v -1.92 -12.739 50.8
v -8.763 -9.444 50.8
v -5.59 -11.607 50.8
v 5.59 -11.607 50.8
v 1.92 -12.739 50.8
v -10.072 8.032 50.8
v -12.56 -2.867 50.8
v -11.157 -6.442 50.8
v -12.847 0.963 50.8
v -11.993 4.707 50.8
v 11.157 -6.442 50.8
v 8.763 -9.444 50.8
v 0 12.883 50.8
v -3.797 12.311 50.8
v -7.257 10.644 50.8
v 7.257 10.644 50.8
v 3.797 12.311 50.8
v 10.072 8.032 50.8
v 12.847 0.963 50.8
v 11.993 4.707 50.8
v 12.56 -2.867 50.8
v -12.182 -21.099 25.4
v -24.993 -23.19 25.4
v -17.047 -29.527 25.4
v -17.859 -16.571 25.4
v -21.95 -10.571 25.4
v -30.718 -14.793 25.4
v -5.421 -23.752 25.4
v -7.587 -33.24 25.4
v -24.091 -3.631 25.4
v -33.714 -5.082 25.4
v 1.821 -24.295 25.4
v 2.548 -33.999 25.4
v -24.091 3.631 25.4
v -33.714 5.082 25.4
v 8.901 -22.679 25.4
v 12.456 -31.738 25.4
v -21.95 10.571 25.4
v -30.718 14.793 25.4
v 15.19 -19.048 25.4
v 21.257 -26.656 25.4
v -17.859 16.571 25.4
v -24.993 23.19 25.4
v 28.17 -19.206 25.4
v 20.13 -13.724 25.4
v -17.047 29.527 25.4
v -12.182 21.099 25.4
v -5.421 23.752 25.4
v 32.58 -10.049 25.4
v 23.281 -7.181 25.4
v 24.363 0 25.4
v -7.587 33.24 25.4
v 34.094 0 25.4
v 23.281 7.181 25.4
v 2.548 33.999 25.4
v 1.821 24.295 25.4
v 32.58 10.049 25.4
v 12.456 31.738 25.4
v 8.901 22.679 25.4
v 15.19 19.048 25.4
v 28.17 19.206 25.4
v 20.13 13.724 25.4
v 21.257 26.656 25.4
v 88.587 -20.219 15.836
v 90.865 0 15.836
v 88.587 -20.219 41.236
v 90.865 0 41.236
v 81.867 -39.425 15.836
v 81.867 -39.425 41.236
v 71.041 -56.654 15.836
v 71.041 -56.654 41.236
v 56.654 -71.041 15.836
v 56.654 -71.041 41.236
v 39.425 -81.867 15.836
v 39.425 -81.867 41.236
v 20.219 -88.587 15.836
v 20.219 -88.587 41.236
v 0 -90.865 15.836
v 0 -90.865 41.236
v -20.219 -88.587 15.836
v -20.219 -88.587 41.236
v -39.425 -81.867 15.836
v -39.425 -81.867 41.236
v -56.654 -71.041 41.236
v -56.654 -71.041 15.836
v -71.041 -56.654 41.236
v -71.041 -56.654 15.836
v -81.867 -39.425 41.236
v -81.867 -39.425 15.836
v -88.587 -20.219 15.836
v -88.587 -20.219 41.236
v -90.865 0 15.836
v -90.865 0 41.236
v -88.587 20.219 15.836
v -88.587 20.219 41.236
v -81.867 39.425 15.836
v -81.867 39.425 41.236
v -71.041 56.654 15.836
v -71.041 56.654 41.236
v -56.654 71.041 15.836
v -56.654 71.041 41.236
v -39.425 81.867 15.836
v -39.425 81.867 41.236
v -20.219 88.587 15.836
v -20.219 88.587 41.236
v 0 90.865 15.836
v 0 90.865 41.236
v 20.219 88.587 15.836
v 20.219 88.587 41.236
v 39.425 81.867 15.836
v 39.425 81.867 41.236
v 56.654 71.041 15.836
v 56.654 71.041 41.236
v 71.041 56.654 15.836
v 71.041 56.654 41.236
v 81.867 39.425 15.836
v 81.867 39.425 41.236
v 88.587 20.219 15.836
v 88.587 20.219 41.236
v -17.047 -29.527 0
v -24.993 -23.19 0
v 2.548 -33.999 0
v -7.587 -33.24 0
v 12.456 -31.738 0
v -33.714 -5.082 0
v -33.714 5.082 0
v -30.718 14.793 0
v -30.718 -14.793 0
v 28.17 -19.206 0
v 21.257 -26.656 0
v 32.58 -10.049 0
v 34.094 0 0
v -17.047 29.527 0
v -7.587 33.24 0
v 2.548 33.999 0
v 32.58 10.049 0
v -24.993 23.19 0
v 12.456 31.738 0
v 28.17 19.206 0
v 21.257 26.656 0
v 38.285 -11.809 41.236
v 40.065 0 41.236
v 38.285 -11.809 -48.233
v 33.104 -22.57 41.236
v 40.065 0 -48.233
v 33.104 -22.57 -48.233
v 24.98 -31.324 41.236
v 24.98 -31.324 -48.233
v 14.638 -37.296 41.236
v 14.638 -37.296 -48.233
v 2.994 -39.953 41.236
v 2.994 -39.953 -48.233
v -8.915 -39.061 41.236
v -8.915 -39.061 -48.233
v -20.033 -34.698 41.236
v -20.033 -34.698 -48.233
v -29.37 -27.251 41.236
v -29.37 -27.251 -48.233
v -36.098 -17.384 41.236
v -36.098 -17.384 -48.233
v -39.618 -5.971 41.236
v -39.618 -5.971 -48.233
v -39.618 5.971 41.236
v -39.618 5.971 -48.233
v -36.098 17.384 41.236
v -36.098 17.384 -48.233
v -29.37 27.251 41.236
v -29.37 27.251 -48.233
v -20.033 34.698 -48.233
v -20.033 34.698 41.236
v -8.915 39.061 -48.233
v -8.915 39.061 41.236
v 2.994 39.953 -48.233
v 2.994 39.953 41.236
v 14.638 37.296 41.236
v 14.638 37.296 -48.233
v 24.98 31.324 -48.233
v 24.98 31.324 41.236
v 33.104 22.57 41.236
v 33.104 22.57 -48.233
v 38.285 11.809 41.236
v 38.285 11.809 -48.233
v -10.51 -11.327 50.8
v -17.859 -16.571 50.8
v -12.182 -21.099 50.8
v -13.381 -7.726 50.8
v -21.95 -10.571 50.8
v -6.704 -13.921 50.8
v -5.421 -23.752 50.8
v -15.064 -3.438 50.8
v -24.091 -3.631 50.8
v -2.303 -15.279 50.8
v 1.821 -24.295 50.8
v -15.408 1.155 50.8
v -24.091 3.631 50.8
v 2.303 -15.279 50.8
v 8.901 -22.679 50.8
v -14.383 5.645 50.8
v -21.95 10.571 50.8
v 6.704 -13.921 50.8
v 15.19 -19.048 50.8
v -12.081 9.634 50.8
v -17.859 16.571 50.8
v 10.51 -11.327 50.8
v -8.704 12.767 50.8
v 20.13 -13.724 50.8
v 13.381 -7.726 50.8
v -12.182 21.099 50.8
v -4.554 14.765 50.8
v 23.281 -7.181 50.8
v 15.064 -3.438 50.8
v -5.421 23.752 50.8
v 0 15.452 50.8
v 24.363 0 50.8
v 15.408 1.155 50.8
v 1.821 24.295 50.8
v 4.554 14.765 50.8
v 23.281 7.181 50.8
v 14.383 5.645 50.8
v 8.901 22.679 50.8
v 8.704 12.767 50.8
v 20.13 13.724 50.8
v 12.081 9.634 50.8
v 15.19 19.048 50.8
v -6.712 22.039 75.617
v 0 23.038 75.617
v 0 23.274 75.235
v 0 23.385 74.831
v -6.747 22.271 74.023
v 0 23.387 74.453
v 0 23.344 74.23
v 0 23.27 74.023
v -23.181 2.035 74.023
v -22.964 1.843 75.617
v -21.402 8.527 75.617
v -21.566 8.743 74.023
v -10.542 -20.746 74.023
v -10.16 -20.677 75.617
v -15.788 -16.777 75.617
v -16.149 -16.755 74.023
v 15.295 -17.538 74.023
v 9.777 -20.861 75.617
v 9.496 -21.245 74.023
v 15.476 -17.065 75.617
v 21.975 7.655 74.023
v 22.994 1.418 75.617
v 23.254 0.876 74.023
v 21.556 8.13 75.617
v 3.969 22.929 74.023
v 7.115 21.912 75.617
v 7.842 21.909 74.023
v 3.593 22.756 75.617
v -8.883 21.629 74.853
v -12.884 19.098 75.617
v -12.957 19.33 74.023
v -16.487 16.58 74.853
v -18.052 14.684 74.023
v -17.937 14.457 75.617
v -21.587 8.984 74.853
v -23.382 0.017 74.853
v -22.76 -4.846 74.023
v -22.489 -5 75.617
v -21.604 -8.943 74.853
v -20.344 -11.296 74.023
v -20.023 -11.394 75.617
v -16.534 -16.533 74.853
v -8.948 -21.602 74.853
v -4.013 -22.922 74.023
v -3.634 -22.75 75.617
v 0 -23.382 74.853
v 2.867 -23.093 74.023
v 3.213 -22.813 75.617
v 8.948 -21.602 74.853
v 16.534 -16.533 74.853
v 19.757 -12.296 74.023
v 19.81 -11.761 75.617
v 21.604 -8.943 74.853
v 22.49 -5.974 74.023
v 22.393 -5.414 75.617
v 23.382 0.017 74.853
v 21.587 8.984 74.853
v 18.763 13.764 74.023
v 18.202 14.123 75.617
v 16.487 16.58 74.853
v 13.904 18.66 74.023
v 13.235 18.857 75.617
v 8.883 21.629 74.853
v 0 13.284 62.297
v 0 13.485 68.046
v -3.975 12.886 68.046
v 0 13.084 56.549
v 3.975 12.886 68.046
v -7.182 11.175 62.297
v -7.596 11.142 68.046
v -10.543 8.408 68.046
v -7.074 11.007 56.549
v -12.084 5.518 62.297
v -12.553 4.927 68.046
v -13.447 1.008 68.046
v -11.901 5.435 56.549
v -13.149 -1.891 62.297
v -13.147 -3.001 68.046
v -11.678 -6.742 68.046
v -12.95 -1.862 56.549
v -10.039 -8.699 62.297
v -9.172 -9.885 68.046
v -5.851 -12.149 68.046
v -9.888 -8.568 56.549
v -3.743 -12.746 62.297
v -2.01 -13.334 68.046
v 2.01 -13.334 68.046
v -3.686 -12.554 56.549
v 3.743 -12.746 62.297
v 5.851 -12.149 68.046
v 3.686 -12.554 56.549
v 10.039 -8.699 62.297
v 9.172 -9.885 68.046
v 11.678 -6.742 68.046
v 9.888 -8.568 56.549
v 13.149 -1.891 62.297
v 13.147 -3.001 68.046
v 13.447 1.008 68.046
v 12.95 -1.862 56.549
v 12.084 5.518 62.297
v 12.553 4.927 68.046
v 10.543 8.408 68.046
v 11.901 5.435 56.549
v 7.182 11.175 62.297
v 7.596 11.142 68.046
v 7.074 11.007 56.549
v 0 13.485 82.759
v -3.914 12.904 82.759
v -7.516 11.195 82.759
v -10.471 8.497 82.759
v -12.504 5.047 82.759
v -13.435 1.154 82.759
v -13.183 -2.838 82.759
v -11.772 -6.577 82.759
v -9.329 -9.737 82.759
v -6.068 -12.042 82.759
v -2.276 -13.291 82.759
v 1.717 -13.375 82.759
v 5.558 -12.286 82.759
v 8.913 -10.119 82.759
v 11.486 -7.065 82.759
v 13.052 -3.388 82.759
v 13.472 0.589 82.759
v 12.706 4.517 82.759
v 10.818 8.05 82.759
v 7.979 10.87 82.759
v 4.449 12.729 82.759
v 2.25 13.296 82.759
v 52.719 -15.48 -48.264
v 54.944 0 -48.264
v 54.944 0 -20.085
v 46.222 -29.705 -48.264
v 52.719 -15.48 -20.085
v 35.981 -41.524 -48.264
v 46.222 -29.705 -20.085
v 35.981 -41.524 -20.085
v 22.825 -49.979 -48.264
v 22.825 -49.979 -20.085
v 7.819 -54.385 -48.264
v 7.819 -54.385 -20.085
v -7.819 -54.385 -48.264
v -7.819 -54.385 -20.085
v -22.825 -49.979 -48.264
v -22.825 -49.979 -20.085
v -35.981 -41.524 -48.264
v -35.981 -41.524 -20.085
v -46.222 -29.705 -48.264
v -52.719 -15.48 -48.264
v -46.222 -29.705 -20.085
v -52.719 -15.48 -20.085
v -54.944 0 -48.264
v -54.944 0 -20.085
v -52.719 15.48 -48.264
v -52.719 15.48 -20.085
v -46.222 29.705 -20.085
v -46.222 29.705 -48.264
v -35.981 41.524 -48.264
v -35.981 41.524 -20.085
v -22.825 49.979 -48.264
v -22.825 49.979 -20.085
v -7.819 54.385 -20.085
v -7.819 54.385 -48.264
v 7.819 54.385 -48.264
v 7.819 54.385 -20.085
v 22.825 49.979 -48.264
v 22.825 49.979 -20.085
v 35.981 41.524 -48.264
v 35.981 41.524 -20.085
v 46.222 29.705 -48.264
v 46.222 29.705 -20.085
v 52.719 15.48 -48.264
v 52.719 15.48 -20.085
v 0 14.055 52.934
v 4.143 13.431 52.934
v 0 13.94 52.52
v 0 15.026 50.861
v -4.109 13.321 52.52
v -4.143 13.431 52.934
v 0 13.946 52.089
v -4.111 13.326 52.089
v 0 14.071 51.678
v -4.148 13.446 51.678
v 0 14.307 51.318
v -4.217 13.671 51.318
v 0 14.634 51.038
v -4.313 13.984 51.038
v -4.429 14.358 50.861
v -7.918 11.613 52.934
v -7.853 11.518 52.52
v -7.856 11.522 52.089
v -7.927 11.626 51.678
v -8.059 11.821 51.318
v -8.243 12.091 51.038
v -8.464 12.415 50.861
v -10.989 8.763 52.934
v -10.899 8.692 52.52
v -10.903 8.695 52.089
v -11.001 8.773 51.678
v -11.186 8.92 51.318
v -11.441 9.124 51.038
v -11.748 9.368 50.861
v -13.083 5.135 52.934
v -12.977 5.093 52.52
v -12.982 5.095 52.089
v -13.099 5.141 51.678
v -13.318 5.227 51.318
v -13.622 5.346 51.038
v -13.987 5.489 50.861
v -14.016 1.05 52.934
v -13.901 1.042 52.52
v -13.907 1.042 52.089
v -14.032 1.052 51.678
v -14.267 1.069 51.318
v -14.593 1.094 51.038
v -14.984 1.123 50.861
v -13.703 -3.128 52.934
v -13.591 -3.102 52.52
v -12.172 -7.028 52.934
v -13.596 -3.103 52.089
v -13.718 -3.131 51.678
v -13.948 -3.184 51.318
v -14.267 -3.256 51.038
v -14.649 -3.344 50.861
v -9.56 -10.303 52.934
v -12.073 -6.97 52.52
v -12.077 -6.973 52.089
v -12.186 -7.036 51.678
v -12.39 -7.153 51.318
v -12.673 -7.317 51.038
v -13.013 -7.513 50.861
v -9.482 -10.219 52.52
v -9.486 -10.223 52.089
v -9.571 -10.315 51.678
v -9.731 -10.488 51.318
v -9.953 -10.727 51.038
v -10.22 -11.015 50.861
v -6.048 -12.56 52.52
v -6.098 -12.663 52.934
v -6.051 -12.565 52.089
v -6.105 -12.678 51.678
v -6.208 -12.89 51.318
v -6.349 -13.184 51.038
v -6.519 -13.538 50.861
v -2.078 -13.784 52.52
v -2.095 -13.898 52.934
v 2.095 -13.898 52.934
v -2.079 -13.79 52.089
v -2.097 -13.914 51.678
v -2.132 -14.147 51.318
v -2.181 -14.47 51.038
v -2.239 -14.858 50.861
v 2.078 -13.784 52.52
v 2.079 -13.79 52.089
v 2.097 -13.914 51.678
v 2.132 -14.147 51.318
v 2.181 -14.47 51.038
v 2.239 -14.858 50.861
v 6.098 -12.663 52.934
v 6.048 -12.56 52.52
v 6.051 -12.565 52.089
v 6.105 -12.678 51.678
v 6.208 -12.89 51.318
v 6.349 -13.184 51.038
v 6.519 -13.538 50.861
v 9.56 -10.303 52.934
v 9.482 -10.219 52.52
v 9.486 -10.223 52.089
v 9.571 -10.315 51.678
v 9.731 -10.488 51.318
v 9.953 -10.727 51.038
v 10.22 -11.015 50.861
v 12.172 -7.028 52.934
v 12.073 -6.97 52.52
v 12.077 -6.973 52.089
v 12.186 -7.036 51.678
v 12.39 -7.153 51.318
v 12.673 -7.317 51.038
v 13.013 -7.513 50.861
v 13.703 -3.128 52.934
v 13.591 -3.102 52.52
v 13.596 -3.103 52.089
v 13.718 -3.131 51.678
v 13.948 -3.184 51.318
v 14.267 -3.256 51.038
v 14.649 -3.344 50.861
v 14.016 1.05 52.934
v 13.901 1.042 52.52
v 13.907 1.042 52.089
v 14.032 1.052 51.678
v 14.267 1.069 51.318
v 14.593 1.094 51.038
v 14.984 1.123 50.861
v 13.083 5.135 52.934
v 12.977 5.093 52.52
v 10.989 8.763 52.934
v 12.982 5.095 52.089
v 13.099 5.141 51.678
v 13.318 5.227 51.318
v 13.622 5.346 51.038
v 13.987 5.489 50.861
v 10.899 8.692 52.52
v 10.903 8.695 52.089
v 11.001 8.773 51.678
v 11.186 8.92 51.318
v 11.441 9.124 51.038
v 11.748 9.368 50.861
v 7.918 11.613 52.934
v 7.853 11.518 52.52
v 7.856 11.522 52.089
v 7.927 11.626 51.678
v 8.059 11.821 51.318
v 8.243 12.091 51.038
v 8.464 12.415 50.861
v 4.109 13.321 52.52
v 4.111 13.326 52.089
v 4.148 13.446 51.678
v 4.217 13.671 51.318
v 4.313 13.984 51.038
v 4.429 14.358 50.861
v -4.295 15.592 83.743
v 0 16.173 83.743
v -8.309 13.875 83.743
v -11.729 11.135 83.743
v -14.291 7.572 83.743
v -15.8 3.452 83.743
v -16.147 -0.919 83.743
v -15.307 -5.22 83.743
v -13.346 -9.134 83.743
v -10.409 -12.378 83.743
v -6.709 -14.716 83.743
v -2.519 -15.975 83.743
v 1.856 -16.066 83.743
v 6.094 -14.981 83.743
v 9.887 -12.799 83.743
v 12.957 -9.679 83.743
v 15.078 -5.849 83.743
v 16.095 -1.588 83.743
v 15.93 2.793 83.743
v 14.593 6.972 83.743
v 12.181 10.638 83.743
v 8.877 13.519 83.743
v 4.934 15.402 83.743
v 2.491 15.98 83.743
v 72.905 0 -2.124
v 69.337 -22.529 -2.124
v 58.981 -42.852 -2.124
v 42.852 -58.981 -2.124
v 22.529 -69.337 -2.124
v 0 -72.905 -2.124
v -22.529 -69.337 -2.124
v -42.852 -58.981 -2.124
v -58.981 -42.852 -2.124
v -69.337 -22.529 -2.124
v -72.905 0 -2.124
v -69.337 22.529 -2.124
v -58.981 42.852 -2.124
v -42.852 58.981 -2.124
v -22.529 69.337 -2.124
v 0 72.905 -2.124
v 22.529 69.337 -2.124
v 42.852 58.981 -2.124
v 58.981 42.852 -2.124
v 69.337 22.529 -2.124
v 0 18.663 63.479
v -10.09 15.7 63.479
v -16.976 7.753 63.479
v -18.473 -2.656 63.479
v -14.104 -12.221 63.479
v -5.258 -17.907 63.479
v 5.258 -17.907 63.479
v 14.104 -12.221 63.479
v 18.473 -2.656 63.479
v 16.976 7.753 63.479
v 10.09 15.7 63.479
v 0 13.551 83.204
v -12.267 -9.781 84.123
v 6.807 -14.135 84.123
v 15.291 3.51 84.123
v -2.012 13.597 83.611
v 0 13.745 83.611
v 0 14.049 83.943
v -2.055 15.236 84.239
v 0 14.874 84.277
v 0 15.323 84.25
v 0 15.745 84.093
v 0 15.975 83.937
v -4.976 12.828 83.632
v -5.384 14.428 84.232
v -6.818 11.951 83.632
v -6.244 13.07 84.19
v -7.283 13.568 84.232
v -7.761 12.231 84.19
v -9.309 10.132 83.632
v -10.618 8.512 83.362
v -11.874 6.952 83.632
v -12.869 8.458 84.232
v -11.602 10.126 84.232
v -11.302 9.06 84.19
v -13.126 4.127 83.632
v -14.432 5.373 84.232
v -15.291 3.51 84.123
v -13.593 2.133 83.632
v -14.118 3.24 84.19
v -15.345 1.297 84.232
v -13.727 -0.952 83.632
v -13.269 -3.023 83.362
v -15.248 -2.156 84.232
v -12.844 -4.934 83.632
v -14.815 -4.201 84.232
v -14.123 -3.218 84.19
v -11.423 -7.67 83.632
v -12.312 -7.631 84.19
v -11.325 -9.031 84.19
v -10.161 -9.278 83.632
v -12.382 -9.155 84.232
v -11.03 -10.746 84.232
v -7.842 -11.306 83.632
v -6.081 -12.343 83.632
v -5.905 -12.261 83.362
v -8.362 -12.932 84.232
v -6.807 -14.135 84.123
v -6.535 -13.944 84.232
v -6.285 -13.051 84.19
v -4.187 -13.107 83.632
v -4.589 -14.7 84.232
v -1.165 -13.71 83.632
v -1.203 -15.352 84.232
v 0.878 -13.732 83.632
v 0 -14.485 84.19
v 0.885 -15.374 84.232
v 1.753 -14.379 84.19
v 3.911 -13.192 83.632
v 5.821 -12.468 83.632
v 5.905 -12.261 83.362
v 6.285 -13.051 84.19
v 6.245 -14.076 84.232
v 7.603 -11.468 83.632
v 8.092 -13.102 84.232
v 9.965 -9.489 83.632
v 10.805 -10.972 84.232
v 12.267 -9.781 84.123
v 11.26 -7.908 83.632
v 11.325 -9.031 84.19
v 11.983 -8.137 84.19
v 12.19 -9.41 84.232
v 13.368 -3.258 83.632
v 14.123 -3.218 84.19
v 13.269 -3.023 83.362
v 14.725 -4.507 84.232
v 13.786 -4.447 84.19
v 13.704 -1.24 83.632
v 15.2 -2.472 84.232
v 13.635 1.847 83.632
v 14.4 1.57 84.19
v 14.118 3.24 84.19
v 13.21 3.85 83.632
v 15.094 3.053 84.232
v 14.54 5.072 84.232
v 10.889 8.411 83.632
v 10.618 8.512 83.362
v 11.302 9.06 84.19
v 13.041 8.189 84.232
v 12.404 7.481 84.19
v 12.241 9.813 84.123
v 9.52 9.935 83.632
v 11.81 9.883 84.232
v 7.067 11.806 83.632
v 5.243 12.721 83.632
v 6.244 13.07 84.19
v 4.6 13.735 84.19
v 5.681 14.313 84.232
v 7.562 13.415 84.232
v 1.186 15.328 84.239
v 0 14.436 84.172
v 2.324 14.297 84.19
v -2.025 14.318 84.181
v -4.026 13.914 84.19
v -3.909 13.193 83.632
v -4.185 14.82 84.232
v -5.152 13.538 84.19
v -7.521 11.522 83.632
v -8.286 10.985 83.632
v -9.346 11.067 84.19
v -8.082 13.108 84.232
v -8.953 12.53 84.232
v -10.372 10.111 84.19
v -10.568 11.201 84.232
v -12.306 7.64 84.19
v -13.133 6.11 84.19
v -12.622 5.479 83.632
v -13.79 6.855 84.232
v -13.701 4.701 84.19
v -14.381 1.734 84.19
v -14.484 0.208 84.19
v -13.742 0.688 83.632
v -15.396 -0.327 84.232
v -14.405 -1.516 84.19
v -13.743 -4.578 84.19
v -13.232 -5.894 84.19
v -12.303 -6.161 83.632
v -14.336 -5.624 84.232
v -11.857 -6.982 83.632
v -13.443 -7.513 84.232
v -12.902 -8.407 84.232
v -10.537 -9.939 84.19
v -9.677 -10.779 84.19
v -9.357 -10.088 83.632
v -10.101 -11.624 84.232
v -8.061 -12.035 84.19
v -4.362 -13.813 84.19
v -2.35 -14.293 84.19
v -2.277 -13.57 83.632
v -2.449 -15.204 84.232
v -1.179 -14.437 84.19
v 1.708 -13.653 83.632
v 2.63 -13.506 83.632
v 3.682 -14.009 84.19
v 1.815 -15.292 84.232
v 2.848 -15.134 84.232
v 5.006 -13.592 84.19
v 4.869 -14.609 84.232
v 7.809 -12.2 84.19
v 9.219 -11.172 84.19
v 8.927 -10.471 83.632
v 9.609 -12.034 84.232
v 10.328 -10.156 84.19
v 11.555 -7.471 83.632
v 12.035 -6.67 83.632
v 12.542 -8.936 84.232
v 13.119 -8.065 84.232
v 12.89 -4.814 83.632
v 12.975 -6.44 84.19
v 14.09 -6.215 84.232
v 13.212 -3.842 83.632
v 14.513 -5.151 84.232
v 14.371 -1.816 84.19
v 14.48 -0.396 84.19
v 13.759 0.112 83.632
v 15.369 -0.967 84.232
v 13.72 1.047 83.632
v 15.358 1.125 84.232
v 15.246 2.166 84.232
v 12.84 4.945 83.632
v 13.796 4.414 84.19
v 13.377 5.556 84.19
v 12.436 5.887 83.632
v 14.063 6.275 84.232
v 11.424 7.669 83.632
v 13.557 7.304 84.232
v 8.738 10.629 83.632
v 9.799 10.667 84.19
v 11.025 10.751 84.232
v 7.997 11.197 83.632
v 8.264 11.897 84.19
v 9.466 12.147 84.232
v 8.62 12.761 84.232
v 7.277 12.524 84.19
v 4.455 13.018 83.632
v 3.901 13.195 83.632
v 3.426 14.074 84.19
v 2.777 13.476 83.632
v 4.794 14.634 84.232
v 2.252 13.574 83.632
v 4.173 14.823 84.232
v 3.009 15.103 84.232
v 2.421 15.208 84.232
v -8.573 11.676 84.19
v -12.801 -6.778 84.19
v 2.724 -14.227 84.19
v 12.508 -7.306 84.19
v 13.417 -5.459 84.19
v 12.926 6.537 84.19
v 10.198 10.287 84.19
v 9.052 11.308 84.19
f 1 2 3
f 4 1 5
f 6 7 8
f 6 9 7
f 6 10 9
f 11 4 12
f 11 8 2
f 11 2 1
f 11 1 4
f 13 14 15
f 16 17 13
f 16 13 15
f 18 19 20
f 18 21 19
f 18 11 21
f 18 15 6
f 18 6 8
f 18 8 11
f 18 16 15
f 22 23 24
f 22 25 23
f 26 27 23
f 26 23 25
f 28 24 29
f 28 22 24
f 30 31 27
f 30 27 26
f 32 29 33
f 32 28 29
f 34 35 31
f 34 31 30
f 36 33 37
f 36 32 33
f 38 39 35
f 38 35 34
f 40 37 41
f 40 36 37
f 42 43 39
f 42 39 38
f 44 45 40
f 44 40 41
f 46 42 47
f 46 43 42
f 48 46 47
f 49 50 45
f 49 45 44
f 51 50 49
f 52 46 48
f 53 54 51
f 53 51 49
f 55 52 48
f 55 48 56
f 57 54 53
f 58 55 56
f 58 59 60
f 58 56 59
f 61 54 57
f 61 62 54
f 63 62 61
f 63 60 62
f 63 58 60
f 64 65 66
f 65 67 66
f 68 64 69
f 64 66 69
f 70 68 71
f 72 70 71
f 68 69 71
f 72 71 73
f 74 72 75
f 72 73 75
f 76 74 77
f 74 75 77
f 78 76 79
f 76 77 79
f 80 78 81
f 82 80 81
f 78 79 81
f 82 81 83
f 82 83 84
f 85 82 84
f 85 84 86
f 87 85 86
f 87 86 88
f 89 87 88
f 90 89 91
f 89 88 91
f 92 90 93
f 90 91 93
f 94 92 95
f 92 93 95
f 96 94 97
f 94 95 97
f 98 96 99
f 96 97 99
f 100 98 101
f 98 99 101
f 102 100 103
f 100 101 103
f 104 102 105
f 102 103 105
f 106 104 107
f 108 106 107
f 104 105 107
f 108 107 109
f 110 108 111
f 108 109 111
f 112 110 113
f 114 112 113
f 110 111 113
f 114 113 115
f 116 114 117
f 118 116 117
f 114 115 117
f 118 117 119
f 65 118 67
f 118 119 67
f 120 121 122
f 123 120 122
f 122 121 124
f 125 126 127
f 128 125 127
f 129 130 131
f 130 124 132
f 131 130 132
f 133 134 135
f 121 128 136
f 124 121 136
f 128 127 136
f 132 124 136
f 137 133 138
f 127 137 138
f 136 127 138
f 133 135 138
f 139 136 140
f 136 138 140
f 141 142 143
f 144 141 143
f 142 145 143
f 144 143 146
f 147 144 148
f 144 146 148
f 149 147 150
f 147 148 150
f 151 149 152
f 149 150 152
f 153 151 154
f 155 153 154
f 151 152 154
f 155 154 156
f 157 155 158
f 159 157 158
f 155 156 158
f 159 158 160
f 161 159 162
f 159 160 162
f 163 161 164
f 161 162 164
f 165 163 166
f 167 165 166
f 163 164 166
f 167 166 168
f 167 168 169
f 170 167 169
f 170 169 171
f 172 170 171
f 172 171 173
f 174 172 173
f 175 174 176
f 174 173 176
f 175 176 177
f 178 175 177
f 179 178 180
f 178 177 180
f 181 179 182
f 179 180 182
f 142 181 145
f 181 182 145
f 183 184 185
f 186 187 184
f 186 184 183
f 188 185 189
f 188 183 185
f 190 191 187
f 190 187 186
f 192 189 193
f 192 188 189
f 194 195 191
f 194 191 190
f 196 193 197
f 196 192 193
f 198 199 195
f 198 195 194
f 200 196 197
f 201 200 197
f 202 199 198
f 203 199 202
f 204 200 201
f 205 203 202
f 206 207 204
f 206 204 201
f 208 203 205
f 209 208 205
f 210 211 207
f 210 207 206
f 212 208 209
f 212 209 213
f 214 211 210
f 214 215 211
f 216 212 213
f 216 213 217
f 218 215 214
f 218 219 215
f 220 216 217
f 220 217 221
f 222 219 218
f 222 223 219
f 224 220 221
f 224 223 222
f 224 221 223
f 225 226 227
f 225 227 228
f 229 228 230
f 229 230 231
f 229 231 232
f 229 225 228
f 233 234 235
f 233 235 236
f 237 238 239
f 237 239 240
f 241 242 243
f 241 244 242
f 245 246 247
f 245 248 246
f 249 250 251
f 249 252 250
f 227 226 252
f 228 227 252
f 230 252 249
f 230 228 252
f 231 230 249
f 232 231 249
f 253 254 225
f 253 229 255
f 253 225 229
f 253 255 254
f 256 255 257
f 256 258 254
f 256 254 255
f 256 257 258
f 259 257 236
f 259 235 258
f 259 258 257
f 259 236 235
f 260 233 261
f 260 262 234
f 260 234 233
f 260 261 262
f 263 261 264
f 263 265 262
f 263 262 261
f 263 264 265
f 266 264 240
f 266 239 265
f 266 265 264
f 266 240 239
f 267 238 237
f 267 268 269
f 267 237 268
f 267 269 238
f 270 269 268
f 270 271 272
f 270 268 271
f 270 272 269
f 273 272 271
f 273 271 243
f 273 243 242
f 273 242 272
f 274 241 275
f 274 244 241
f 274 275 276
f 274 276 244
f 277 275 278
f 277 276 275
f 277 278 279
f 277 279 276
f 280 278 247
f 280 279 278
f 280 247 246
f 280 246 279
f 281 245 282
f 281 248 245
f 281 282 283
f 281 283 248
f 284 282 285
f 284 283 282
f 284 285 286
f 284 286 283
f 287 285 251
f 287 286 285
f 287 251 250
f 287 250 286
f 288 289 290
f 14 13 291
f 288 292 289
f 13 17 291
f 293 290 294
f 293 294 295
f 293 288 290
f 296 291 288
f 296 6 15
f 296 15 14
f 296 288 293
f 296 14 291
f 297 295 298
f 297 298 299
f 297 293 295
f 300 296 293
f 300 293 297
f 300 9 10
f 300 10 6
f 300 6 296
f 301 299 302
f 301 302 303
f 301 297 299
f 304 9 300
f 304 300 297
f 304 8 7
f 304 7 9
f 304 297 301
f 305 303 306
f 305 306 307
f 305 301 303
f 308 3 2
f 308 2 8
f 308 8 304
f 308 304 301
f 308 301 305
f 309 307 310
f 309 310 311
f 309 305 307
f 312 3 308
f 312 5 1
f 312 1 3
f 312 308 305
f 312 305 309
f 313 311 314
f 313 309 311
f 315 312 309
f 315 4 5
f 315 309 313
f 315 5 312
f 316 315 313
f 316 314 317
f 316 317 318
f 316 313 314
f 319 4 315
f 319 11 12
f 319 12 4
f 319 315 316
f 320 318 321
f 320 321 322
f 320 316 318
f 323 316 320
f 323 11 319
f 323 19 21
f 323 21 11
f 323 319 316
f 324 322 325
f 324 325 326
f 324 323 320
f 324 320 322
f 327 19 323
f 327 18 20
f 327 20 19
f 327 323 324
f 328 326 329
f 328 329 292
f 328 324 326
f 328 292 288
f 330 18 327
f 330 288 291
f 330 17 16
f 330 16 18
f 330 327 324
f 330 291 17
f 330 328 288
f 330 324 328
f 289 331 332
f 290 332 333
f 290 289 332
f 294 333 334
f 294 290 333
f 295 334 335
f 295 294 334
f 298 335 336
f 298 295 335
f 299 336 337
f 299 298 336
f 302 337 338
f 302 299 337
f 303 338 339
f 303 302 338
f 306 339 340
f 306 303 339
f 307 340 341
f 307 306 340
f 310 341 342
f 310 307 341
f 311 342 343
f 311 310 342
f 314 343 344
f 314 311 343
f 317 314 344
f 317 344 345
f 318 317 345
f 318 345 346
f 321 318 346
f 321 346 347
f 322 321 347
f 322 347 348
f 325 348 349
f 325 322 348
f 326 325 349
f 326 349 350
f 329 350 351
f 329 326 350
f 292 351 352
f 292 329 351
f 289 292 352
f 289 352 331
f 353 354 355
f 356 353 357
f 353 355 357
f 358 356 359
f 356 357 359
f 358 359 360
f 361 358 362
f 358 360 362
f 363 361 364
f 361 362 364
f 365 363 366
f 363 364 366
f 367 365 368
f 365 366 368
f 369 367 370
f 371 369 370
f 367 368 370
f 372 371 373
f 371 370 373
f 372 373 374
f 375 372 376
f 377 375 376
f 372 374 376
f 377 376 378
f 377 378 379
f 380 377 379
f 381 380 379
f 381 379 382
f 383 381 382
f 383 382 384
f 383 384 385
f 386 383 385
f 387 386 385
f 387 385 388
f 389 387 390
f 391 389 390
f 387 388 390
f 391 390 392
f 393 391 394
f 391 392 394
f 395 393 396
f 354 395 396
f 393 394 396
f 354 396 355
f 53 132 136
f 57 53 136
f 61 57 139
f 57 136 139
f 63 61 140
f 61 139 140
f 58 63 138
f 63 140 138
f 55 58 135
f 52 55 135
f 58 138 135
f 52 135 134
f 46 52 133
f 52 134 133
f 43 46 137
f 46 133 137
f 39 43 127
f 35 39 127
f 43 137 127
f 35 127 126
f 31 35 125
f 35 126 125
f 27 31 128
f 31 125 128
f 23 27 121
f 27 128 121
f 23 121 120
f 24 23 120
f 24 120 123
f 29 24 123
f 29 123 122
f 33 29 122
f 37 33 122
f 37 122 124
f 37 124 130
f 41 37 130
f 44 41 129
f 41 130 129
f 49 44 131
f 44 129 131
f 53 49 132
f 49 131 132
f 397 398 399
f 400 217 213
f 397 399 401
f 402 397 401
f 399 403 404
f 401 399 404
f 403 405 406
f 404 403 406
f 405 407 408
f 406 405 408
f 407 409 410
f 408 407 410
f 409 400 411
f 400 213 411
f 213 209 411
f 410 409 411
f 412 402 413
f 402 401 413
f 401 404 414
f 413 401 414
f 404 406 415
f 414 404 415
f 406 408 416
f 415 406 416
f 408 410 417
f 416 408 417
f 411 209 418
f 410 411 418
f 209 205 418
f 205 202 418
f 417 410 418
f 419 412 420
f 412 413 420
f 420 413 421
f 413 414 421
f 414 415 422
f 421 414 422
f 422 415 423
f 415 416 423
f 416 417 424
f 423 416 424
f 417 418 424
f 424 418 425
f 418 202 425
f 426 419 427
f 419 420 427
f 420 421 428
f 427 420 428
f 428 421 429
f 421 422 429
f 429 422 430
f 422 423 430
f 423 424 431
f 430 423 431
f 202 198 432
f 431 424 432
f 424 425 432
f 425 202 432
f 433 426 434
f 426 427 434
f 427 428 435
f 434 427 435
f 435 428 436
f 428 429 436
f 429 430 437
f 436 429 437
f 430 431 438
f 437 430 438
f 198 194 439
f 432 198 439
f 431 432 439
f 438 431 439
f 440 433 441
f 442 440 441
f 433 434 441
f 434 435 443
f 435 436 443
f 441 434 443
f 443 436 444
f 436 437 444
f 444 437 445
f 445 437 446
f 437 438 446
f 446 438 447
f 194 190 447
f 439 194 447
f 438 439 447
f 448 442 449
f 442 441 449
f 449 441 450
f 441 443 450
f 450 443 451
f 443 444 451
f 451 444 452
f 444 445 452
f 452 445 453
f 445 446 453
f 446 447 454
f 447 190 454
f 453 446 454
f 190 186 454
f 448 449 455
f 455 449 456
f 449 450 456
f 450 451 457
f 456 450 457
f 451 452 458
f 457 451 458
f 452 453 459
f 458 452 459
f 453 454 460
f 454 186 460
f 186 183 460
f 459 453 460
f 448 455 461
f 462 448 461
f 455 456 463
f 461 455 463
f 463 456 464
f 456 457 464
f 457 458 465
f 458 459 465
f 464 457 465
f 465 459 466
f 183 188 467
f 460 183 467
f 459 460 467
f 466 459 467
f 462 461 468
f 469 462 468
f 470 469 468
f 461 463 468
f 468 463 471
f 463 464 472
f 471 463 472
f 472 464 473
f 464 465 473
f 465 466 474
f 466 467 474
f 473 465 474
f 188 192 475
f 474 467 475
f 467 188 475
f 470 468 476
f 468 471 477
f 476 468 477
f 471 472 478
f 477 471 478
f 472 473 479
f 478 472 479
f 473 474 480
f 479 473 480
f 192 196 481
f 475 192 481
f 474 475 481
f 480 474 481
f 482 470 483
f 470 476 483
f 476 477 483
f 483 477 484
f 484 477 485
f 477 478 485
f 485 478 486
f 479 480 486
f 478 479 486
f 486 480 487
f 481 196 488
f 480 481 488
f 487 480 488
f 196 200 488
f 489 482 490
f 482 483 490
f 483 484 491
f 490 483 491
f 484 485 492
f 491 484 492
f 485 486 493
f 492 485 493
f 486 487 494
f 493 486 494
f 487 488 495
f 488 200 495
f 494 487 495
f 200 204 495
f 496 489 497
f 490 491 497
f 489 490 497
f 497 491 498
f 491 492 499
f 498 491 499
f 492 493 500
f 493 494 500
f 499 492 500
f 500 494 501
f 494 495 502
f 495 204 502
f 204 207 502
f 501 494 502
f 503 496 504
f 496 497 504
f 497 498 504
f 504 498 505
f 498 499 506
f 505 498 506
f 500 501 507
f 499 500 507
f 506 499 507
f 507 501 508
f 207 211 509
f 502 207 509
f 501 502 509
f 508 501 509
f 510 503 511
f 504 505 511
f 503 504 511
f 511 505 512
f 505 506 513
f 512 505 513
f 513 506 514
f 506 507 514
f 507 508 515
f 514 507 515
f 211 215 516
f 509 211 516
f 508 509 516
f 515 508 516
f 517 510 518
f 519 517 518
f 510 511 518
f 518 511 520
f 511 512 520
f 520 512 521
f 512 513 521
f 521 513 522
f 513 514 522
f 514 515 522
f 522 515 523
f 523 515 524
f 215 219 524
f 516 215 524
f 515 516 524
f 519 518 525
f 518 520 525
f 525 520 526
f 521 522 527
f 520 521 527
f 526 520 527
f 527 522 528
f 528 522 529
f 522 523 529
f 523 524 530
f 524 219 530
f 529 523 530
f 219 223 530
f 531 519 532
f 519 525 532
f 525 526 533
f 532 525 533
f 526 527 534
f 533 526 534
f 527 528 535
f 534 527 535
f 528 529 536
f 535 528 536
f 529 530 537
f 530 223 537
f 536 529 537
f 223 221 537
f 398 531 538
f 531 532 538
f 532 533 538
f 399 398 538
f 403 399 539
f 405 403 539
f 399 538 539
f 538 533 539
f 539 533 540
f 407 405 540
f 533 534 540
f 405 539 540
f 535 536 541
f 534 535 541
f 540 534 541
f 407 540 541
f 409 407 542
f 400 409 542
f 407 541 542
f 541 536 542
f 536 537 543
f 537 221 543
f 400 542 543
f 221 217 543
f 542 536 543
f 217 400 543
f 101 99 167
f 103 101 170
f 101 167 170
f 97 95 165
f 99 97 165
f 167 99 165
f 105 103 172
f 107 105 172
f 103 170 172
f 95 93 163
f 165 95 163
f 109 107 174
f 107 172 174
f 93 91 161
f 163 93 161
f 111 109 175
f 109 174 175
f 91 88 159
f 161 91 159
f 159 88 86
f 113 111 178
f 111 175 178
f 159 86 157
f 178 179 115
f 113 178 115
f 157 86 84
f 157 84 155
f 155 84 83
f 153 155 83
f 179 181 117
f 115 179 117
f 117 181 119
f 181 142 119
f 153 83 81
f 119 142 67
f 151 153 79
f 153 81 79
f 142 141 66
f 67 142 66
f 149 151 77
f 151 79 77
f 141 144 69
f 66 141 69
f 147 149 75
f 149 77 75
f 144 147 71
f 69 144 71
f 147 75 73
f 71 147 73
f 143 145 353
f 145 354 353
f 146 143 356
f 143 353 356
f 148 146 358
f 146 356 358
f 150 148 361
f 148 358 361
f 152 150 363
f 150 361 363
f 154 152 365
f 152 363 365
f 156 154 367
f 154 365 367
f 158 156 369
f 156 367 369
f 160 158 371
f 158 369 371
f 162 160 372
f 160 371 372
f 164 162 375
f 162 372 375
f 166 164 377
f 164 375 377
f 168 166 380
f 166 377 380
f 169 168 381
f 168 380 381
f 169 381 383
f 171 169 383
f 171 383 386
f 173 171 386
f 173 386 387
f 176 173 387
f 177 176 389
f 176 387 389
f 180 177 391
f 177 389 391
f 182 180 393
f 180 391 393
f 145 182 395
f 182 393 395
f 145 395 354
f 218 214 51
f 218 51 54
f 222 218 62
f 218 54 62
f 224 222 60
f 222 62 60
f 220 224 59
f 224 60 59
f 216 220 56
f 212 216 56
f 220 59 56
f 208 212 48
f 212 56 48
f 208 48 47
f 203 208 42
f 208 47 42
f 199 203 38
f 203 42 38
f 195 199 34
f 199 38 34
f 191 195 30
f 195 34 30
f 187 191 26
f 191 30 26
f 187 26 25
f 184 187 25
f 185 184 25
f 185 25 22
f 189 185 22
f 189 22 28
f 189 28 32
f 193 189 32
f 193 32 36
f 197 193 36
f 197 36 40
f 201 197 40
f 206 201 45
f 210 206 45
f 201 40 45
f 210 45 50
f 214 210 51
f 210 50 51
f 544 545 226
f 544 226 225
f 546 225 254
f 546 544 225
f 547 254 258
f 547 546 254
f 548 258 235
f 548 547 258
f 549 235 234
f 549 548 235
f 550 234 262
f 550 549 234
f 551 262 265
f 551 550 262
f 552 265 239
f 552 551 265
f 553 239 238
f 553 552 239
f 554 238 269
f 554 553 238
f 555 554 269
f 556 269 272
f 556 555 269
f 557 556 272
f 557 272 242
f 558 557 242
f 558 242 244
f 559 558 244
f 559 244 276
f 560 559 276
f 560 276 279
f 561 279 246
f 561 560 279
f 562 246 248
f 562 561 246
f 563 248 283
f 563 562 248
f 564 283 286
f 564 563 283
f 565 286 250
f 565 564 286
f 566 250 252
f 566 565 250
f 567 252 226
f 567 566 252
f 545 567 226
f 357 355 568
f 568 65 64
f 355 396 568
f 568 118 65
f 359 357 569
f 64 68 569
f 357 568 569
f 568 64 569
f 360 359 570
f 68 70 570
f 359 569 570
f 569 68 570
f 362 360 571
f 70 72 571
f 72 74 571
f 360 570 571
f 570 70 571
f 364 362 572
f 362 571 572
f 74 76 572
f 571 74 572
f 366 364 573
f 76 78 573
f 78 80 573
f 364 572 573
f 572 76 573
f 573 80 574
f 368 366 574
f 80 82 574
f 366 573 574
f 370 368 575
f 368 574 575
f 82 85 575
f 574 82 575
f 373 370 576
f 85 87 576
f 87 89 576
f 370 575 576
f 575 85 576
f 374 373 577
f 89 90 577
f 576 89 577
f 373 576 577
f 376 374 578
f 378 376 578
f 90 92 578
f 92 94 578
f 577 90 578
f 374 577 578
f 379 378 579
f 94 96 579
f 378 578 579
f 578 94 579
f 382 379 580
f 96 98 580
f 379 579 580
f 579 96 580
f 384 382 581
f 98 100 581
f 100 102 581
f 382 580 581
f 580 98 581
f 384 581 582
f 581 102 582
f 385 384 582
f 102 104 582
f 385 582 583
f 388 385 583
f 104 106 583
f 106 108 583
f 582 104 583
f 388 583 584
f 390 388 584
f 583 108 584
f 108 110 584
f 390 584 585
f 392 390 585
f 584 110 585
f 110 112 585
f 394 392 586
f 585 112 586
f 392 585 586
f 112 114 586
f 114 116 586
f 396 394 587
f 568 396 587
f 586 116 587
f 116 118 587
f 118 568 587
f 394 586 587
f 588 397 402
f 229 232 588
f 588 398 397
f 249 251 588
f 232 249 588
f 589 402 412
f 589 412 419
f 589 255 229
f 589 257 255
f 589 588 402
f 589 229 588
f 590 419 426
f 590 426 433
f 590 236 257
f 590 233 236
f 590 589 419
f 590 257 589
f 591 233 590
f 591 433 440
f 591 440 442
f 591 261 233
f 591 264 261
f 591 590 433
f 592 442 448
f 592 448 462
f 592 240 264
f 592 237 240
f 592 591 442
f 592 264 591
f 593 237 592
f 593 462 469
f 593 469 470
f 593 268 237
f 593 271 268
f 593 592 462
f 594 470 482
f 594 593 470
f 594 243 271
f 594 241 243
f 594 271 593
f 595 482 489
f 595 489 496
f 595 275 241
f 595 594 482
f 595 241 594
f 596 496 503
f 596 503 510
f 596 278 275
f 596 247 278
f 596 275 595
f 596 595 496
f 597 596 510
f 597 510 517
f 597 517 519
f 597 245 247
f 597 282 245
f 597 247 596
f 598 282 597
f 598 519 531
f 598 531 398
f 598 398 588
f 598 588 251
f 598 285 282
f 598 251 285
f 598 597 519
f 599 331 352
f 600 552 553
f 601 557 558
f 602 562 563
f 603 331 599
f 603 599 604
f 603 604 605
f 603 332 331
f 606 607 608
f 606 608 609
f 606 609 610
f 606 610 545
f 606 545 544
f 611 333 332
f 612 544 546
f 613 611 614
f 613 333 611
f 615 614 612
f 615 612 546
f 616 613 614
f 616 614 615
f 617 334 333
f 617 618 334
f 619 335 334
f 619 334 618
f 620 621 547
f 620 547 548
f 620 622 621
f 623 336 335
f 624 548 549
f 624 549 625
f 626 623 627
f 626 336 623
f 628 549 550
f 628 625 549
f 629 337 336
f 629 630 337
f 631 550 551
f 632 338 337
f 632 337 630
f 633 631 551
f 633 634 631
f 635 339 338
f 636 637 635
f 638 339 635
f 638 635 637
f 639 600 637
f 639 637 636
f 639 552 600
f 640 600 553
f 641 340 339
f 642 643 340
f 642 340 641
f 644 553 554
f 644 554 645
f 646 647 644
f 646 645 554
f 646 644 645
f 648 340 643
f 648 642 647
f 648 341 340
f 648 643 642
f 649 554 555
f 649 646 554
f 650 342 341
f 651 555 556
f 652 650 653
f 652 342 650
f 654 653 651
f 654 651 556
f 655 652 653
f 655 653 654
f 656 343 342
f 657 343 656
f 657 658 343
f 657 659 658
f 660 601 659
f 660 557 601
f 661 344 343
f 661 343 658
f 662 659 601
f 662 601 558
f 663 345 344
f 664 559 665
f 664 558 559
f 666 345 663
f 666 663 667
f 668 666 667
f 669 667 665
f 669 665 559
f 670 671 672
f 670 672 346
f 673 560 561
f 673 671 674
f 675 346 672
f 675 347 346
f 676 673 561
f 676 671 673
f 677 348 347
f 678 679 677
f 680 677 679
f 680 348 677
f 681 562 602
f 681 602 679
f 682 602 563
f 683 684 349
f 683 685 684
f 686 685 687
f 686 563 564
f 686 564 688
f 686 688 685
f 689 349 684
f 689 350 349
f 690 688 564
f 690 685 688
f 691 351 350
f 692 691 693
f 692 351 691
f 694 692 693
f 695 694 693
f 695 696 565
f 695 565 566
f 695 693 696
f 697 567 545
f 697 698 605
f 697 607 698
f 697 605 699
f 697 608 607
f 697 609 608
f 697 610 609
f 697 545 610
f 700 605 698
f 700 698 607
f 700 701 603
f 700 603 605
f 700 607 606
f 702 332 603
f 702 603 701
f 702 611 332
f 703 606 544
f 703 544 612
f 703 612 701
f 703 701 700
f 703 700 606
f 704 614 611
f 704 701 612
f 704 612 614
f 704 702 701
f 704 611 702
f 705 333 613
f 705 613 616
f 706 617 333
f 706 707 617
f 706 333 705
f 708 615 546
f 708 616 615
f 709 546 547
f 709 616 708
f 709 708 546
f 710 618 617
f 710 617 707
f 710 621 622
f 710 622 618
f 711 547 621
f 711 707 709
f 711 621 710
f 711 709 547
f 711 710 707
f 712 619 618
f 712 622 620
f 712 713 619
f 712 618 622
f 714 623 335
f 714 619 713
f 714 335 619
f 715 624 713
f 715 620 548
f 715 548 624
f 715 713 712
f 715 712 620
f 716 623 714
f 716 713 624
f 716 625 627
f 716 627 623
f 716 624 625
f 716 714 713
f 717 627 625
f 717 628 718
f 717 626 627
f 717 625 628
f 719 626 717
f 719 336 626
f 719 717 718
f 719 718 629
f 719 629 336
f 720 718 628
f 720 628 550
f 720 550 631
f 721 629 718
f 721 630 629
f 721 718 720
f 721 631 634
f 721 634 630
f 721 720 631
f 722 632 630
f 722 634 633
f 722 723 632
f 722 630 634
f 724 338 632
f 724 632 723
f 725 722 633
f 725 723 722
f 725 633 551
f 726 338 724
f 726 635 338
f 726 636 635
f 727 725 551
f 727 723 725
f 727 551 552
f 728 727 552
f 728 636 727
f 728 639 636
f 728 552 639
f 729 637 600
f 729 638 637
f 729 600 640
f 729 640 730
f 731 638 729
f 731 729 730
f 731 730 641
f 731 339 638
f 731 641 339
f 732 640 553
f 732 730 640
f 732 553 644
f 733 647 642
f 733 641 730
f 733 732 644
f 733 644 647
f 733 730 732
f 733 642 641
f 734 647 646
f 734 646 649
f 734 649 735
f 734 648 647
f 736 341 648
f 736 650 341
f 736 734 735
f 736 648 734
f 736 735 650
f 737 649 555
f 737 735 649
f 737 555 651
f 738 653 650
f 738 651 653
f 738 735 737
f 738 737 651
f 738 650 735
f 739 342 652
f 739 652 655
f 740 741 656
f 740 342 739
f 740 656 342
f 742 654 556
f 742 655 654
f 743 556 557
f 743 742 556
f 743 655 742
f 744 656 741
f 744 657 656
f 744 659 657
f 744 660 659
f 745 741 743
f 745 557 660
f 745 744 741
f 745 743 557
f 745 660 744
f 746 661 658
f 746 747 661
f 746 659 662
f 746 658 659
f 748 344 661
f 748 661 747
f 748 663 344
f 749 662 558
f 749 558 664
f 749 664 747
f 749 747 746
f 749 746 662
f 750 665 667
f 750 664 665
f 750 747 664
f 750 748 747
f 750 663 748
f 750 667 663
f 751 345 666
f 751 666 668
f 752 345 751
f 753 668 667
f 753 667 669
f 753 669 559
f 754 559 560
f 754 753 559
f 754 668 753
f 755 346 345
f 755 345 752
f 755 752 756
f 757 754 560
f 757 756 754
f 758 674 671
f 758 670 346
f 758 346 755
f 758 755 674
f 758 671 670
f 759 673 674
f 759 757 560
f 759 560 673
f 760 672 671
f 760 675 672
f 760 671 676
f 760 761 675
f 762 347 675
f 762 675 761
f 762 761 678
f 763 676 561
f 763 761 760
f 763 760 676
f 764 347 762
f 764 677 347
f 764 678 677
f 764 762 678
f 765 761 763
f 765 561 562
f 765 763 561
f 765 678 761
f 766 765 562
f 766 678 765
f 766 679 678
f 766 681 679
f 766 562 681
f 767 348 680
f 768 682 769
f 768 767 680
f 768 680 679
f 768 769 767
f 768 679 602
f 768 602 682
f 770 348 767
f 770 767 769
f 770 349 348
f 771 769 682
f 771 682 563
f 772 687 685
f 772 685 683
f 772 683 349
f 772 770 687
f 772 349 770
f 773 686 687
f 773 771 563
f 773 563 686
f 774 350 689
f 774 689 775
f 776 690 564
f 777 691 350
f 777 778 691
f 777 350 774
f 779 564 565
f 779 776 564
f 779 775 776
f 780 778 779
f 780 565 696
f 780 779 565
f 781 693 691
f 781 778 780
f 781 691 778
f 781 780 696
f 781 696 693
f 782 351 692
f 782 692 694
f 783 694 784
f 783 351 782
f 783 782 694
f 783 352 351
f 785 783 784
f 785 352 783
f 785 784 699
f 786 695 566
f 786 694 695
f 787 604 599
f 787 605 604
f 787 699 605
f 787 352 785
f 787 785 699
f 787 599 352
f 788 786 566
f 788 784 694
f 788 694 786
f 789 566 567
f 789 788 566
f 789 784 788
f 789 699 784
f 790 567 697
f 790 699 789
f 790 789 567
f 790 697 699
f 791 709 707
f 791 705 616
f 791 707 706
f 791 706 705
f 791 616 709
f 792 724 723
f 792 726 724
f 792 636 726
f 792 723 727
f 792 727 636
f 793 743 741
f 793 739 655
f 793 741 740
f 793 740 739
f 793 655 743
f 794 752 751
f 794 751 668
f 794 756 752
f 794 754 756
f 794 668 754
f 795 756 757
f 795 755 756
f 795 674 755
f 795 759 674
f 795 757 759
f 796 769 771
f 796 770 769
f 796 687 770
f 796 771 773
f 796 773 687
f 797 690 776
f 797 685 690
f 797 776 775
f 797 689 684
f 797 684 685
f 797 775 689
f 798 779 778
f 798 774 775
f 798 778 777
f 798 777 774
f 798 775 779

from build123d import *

# Parameters (mm, degrees)
F0_R     = 34.094364
F1_DEPTH = 25.4
F2_R     = 24.363189
F3_DEPTH = 25.4
F6_R     = 1.524


with BuildPart() as f1:
    # F0 (on Top) → F1 (new body)
    with BuildSketch(Plane.XY):
        Circle(F0_R)
    extrude(amount=F1_DEPTH)

    # F2 (on face) → F3 (join)
    with BuildSketch(Plane.XY.offset(25.4)):
        Circle(F2_R)
    extrude(amount=F3_DEPTH)

    # F4 (on Right) → F5 (revolve)
    with BuildSketch(Plane.YZ):
        Polygon((13.484687, 68.045951), (12.86231, 50.204642), (23.65008, 74.892037), (13.484687, 86.924553), align=None)
    revolve(axis=Axis((0, 0, 50.8), (0, 0, 1)))

    # F6
    f6_edges = [f1.edges().sort_by_distance(p)[0] for p in [
        (0, -23.65008, 74.892037),
        (0, -13.484687, 86.924553),
        (0, 18.567383, 80.908295),
        (0, -13.122466, 50.8),
        (0, 18.386273, 62.846018),
    ]]
    fillet(f6_edges, radius=F6_R)


with BuildPart() as f8:
    # F7 (on Front) → F8 (revolve)
    with BuildSketch(Plane.XZ):
        Polygon((54.944317, -20.084962), (90.865342, 15.836063), (90.865342, 41.236063), (40.065342, 41.236063), (40.065342, -48.232985), (54.944317, -48.263822), align=None)
    revolve(axis=Axis((0, 0, 0), (0, 0, -1)))


solid = Compound([f1.part, f8.part])
